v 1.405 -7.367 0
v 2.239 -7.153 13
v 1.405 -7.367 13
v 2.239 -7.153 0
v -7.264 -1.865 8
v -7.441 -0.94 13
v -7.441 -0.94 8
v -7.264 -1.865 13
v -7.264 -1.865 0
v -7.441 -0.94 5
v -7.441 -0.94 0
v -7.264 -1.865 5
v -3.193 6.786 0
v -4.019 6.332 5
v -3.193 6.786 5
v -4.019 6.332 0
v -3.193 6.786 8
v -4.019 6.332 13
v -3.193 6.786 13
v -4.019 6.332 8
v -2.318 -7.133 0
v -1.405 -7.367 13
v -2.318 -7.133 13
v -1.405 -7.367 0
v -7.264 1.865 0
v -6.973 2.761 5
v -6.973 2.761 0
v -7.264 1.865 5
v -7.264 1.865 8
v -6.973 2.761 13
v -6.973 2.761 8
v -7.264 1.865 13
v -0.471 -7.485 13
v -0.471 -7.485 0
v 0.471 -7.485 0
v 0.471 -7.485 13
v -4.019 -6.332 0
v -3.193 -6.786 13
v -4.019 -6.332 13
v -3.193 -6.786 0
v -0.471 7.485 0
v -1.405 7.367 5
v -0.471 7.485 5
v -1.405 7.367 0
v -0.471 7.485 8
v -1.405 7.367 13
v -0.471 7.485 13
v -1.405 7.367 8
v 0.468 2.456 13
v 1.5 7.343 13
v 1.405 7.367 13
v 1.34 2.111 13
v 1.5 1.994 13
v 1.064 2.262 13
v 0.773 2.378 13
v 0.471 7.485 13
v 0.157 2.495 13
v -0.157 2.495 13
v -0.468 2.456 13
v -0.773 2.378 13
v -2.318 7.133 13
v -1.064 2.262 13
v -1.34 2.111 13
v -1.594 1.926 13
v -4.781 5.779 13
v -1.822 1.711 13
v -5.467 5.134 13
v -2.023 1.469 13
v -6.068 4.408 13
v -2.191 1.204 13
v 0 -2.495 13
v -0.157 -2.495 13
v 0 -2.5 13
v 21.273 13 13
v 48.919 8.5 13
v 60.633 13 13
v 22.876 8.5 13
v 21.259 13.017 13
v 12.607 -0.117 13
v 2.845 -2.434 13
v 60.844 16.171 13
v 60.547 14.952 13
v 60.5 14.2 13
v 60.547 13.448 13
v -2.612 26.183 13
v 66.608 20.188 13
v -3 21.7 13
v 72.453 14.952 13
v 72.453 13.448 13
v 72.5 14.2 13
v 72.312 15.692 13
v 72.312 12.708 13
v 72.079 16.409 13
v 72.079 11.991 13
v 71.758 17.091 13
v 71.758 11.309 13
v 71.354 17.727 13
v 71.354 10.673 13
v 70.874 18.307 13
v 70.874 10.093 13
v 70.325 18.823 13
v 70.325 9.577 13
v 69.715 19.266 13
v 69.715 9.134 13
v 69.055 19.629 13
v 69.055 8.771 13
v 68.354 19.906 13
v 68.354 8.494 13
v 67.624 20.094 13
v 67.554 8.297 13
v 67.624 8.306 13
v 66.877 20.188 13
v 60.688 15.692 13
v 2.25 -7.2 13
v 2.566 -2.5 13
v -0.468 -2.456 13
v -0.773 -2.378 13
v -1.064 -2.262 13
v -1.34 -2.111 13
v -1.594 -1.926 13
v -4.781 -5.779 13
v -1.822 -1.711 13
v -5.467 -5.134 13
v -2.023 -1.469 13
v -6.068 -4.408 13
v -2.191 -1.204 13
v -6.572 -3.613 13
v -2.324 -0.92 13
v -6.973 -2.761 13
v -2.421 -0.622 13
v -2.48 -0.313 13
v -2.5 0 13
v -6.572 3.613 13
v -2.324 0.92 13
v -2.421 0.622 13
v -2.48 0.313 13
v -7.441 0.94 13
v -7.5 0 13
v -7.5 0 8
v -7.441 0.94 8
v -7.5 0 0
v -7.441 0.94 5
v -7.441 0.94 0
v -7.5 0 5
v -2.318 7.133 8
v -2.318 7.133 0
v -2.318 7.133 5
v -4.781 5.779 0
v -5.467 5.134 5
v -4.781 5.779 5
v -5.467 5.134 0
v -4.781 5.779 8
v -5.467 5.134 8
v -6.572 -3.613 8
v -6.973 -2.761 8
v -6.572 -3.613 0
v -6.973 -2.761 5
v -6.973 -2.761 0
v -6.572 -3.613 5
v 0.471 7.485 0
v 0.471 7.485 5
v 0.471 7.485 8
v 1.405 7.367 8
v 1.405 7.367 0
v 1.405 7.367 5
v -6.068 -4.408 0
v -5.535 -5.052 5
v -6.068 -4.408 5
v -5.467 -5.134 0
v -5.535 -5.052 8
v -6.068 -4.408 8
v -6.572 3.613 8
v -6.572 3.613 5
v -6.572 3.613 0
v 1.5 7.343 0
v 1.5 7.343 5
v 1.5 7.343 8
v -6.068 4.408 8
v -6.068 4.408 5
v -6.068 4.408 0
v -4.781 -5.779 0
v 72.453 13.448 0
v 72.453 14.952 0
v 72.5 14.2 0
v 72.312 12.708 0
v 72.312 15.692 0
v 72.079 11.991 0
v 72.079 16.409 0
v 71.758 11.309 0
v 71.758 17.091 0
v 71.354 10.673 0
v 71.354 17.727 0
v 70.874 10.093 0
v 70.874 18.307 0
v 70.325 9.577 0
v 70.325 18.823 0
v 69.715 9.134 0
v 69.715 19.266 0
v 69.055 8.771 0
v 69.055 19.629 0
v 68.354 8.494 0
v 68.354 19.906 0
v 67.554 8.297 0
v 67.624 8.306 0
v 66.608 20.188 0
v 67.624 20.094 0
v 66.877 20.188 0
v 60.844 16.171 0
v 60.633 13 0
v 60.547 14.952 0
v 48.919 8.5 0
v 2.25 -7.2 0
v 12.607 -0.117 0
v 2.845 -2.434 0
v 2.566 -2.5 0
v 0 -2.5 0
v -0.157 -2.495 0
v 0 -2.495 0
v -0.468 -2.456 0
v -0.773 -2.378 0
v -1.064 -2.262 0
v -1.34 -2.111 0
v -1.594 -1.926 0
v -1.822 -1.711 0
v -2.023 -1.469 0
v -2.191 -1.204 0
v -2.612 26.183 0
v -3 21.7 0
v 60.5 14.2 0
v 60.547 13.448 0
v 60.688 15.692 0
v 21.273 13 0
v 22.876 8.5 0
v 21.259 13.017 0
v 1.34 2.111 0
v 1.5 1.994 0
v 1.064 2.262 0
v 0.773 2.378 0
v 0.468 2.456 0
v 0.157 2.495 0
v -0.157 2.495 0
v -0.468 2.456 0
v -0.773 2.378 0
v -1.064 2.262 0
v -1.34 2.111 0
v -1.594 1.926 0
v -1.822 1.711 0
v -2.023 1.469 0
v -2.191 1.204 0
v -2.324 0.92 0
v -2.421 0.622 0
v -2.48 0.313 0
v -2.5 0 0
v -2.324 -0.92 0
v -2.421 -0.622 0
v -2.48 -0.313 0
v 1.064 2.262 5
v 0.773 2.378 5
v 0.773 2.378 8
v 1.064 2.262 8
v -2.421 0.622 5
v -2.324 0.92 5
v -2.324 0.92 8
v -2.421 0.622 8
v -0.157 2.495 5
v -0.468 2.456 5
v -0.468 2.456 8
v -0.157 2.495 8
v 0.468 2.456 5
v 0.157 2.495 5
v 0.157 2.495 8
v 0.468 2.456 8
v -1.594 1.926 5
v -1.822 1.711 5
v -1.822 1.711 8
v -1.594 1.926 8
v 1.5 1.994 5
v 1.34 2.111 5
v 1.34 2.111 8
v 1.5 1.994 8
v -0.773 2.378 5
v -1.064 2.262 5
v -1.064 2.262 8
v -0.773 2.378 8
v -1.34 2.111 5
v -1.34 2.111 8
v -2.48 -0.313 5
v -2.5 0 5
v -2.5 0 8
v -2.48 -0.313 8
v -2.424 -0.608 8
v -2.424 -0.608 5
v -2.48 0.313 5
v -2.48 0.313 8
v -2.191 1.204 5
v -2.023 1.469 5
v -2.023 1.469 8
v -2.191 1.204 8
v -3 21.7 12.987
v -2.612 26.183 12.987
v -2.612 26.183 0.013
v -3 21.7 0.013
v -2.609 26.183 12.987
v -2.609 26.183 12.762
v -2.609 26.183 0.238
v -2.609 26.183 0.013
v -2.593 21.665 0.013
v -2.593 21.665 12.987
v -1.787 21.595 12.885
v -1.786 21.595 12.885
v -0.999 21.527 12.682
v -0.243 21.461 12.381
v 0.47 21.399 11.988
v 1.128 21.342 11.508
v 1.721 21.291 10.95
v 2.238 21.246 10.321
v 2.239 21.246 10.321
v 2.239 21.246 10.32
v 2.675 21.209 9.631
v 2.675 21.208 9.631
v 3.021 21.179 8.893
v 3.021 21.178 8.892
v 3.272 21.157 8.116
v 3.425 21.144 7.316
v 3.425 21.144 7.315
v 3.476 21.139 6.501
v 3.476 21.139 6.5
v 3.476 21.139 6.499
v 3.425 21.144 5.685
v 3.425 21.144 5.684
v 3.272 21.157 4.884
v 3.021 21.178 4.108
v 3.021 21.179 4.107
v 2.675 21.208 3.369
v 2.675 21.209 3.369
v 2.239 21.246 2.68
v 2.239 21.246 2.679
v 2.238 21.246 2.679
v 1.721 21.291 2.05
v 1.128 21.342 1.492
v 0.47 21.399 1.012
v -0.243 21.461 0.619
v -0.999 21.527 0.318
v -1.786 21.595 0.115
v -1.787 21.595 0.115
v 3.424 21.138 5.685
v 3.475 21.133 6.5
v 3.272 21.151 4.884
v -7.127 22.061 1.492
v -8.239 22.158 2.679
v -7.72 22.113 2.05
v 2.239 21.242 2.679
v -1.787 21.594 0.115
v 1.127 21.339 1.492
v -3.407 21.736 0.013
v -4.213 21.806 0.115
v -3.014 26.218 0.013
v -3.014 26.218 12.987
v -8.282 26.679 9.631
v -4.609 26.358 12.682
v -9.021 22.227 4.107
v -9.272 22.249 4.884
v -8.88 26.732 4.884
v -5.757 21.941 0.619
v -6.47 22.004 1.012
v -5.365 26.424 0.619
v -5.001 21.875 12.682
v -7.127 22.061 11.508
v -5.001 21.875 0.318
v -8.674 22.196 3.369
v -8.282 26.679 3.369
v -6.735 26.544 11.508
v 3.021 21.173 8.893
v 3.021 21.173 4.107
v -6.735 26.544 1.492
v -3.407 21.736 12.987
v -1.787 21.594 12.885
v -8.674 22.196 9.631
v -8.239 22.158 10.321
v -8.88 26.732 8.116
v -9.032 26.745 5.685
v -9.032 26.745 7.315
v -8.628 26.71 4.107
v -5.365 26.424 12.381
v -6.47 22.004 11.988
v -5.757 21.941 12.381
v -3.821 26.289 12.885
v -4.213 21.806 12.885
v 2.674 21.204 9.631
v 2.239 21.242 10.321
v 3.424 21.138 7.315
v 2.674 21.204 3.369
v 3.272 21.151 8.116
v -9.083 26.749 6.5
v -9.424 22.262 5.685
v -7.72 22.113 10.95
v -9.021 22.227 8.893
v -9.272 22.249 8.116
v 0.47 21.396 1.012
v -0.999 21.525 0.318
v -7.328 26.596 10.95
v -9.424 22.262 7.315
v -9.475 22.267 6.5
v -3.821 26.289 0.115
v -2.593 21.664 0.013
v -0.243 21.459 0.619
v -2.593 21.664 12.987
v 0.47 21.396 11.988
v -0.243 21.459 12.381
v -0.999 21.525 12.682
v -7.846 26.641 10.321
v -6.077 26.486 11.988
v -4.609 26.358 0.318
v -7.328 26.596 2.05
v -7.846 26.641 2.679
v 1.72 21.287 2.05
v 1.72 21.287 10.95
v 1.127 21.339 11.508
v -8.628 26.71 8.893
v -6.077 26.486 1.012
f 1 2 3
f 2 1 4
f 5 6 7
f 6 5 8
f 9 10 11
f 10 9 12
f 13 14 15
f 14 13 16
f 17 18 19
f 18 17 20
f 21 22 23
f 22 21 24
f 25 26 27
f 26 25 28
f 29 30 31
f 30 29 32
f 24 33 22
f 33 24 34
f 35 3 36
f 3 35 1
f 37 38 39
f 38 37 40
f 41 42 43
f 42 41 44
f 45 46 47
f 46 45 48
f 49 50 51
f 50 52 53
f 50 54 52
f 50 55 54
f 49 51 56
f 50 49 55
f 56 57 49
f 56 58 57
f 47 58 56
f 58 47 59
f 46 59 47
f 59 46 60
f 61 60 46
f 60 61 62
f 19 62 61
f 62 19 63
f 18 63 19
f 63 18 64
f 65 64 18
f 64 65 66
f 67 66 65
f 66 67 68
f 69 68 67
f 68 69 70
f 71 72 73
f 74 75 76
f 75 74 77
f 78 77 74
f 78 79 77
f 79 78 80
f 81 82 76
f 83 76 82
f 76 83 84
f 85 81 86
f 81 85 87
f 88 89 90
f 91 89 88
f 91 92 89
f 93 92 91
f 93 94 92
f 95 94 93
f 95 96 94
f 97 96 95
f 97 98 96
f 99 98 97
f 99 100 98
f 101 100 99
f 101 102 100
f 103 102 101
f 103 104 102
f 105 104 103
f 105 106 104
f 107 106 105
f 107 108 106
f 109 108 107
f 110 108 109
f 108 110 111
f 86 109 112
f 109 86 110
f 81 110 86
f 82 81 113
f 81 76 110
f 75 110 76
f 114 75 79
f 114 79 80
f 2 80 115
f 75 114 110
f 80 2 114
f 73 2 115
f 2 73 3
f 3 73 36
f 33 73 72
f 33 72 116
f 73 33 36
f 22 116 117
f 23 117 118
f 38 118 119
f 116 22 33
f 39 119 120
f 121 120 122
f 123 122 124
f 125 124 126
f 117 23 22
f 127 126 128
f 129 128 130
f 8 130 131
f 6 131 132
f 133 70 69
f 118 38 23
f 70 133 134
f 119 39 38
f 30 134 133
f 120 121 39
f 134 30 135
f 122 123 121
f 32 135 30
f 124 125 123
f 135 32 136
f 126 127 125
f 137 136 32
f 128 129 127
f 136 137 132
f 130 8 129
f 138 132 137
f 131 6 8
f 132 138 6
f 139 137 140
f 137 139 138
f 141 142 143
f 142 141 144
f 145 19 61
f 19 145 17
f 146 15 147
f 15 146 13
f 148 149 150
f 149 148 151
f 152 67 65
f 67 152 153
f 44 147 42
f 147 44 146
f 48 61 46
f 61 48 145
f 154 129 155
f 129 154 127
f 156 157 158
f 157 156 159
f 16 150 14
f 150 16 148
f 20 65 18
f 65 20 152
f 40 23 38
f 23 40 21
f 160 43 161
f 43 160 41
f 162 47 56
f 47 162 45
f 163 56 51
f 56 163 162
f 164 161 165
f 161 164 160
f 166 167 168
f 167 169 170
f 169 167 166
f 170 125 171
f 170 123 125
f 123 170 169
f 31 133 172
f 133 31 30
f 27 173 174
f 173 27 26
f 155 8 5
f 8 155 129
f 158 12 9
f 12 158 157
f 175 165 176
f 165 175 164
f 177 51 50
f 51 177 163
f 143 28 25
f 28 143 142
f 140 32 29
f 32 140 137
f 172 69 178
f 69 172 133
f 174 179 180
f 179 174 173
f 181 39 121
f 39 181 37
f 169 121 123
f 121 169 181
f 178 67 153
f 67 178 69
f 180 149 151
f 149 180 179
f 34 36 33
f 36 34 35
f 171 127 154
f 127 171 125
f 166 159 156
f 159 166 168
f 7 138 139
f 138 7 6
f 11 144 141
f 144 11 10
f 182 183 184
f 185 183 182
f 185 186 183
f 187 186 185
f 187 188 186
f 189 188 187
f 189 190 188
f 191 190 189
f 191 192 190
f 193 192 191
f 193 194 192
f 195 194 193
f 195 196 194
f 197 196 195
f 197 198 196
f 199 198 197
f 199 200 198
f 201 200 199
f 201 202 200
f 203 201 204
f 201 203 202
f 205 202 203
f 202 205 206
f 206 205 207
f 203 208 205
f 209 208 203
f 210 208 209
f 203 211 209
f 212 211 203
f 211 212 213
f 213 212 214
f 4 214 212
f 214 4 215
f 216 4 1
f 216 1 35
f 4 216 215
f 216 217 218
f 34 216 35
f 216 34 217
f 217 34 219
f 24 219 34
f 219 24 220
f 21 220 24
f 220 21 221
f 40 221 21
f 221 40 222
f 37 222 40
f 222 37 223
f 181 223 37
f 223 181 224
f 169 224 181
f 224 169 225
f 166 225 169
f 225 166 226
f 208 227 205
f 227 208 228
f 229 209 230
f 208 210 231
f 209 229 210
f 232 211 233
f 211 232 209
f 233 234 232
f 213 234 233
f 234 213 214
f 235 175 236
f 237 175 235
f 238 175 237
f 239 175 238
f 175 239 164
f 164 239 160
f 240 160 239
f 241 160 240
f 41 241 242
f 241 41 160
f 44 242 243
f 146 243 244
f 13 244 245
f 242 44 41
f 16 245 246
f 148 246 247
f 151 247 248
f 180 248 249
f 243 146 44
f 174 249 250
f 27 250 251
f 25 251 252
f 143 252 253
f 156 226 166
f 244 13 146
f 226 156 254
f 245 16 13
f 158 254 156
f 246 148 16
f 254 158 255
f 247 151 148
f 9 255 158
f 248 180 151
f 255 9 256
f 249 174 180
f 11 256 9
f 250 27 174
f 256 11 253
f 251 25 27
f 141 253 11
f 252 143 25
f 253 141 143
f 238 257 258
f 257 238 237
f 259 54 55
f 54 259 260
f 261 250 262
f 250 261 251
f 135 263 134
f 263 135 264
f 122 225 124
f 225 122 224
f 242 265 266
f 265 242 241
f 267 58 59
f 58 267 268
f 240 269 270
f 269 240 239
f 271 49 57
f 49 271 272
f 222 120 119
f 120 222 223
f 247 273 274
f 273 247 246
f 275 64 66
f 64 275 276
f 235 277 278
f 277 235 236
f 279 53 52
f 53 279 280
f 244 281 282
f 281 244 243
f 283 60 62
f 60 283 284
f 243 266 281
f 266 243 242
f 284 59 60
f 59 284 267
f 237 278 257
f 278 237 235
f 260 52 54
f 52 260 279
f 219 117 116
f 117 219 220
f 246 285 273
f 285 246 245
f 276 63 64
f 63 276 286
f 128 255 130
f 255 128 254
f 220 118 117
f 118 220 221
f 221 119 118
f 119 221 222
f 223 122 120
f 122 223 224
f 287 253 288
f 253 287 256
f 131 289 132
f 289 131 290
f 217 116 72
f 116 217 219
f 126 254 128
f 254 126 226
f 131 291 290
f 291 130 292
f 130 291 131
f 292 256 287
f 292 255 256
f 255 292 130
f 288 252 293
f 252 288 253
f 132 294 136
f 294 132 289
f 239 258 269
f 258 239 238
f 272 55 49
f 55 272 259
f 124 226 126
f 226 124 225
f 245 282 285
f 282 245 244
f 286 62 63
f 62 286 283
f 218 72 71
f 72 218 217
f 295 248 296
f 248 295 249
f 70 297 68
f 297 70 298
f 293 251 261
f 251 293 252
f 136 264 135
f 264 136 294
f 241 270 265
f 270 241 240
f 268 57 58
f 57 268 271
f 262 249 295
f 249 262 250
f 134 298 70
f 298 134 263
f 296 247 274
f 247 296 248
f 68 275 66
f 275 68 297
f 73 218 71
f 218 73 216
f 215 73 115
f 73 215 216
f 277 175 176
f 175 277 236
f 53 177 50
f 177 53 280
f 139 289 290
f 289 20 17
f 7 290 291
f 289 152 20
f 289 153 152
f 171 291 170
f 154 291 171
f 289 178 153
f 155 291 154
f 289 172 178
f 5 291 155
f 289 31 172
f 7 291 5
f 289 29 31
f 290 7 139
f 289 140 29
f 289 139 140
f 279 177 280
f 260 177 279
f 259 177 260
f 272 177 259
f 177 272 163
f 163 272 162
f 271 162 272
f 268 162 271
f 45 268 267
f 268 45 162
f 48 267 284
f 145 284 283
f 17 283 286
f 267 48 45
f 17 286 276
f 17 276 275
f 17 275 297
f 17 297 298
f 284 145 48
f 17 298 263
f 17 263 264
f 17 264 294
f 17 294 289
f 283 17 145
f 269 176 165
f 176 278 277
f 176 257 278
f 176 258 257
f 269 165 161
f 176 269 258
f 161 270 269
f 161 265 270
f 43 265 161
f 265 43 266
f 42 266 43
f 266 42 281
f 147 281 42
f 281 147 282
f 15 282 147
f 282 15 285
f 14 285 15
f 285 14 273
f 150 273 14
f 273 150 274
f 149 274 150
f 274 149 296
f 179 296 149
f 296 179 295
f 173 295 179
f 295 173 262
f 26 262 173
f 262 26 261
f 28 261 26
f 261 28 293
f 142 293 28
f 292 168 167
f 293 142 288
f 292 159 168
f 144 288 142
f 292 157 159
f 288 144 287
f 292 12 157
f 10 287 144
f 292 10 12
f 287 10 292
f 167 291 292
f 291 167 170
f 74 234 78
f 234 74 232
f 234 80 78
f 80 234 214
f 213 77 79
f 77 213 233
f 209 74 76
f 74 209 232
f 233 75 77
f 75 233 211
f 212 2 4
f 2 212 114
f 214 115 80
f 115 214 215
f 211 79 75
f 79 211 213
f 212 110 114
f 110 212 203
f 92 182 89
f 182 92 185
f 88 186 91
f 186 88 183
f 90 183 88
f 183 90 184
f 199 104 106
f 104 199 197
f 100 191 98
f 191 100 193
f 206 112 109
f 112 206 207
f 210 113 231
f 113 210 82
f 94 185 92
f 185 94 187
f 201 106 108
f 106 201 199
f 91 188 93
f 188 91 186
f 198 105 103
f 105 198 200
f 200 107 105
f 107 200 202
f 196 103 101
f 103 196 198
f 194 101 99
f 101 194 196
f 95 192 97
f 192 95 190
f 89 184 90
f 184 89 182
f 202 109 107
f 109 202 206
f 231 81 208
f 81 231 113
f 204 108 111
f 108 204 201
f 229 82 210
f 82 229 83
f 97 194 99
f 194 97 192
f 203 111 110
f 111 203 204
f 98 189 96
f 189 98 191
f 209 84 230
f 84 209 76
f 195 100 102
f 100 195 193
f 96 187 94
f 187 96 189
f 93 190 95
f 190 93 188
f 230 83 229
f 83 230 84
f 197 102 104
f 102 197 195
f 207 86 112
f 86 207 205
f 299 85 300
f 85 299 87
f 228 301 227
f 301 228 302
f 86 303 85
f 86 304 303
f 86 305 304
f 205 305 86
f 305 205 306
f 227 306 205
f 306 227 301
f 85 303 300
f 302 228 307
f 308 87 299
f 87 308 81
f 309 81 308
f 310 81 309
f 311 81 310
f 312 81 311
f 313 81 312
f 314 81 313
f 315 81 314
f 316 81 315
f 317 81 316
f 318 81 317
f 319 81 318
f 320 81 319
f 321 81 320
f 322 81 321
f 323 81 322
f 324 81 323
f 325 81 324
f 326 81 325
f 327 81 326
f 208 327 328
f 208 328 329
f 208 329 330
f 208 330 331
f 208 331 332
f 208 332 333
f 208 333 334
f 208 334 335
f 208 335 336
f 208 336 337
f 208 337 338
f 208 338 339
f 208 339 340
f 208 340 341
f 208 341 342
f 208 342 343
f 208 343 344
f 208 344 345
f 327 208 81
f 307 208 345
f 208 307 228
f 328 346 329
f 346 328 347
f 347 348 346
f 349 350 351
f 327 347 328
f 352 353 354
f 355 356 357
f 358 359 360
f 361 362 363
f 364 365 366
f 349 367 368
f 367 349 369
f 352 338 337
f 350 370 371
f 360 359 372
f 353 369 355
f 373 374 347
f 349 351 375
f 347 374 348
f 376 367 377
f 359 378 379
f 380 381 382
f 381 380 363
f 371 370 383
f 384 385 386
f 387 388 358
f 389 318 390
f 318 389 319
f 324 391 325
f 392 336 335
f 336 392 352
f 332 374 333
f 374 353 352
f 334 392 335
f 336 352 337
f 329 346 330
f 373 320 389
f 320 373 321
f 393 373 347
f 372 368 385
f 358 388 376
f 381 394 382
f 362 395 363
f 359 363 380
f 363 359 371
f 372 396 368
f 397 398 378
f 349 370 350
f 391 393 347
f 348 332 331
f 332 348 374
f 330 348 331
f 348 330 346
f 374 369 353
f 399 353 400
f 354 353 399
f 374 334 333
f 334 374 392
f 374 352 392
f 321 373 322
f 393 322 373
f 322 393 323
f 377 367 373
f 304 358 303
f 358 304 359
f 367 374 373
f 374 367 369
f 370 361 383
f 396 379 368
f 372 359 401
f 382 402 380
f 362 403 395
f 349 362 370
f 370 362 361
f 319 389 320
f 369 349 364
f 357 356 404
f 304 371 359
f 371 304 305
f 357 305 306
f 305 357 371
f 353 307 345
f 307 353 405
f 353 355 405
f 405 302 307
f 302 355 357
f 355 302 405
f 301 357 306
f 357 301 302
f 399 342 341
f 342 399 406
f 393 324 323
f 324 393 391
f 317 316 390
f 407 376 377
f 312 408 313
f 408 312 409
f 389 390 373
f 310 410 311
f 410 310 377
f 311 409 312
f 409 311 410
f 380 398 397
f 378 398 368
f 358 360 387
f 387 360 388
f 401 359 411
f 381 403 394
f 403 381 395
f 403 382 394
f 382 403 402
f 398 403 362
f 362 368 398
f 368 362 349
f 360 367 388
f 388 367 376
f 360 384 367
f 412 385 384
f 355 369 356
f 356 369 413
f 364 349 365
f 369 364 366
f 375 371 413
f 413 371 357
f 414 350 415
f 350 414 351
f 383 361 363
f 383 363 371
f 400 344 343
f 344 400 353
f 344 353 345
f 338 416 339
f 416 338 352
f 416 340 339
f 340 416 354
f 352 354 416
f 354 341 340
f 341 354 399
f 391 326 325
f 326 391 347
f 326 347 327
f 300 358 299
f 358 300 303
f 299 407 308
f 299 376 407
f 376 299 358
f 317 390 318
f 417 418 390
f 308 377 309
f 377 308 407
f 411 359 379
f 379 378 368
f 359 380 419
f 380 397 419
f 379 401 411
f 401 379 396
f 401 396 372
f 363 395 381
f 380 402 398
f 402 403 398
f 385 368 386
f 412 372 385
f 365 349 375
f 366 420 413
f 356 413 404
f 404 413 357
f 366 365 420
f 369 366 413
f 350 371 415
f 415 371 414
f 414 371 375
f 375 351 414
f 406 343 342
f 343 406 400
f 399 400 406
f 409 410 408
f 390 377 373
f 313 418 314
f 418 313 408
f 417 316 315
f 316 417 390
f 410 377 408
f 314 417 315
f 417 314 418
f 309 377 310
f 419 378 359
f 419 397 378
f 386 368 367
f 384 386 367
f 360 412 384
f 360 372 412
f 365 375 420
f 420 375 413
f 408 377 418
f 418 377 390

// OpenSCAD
module holder() {
    
    union() {
        difference() {
            
            // head
            translate([0, 0, 0]) {
                cylinder(r=7.5, h=$width);        
            }
            translate([0, 0, -1]) {
                cylinder(r=2.5, h=$width+2);
            }
            translate([0, -2.5, -1]) {
                cube([10, 3, $width+2]);
            }
            translate([1.5, 0, -1]) {
                cube([10, 10, $width+2]);
            }            
            
            // gap
            translate([-9, -10, $width/2-$gap/2]) {
                rotate([0, 0, 55]) {
                    cube([20, 10, $gap]);
                }
            }
            translate([-10, 0, $width/2-$gap/2]) {
                rotate([0, 0, 0]) {
                    cube([15, 10, $gap]);
                }
            }            
        }
        
        // body
        translate([5, -6.5, 0]) {
            rotate([0, 0, 40]) {
                cube([25, $tick, $width]);
            }
        }
        translate([21.25, 8.5, 0]) {
            rotate([0, 0, 0]) {
                cube([45, $tick, $width]);
            }
        }
        translate([2.25, -7.2, 0]) {
            rotate([0, 0, 13.35]) {
                cube([67.5, $tick, $width]);
            }
        }
        
        // base
        translate([66.5, 14.2, 0]) {
            cylinder(r=6, h=$width);
        }
        
        // holder
        translate([-3, 26.2-$tick, 0]) {
            rotate([0, 0, -4.95]) {
                cube([70, $tick, $width]);
            }
        }
        translate([-3, 26.2-$tick, $width/2]) {
            rotate([-90, 0, -5]) {
                cylinder(r=$width/2, h=$tick);
            }
        }
    }
}

// modify the values as you want...

$fn=50;
$gap   = 3;    // [2..5]
$width = 13;   // [10..20]
$tick  = 4.5;  // [2..6]

holder();
